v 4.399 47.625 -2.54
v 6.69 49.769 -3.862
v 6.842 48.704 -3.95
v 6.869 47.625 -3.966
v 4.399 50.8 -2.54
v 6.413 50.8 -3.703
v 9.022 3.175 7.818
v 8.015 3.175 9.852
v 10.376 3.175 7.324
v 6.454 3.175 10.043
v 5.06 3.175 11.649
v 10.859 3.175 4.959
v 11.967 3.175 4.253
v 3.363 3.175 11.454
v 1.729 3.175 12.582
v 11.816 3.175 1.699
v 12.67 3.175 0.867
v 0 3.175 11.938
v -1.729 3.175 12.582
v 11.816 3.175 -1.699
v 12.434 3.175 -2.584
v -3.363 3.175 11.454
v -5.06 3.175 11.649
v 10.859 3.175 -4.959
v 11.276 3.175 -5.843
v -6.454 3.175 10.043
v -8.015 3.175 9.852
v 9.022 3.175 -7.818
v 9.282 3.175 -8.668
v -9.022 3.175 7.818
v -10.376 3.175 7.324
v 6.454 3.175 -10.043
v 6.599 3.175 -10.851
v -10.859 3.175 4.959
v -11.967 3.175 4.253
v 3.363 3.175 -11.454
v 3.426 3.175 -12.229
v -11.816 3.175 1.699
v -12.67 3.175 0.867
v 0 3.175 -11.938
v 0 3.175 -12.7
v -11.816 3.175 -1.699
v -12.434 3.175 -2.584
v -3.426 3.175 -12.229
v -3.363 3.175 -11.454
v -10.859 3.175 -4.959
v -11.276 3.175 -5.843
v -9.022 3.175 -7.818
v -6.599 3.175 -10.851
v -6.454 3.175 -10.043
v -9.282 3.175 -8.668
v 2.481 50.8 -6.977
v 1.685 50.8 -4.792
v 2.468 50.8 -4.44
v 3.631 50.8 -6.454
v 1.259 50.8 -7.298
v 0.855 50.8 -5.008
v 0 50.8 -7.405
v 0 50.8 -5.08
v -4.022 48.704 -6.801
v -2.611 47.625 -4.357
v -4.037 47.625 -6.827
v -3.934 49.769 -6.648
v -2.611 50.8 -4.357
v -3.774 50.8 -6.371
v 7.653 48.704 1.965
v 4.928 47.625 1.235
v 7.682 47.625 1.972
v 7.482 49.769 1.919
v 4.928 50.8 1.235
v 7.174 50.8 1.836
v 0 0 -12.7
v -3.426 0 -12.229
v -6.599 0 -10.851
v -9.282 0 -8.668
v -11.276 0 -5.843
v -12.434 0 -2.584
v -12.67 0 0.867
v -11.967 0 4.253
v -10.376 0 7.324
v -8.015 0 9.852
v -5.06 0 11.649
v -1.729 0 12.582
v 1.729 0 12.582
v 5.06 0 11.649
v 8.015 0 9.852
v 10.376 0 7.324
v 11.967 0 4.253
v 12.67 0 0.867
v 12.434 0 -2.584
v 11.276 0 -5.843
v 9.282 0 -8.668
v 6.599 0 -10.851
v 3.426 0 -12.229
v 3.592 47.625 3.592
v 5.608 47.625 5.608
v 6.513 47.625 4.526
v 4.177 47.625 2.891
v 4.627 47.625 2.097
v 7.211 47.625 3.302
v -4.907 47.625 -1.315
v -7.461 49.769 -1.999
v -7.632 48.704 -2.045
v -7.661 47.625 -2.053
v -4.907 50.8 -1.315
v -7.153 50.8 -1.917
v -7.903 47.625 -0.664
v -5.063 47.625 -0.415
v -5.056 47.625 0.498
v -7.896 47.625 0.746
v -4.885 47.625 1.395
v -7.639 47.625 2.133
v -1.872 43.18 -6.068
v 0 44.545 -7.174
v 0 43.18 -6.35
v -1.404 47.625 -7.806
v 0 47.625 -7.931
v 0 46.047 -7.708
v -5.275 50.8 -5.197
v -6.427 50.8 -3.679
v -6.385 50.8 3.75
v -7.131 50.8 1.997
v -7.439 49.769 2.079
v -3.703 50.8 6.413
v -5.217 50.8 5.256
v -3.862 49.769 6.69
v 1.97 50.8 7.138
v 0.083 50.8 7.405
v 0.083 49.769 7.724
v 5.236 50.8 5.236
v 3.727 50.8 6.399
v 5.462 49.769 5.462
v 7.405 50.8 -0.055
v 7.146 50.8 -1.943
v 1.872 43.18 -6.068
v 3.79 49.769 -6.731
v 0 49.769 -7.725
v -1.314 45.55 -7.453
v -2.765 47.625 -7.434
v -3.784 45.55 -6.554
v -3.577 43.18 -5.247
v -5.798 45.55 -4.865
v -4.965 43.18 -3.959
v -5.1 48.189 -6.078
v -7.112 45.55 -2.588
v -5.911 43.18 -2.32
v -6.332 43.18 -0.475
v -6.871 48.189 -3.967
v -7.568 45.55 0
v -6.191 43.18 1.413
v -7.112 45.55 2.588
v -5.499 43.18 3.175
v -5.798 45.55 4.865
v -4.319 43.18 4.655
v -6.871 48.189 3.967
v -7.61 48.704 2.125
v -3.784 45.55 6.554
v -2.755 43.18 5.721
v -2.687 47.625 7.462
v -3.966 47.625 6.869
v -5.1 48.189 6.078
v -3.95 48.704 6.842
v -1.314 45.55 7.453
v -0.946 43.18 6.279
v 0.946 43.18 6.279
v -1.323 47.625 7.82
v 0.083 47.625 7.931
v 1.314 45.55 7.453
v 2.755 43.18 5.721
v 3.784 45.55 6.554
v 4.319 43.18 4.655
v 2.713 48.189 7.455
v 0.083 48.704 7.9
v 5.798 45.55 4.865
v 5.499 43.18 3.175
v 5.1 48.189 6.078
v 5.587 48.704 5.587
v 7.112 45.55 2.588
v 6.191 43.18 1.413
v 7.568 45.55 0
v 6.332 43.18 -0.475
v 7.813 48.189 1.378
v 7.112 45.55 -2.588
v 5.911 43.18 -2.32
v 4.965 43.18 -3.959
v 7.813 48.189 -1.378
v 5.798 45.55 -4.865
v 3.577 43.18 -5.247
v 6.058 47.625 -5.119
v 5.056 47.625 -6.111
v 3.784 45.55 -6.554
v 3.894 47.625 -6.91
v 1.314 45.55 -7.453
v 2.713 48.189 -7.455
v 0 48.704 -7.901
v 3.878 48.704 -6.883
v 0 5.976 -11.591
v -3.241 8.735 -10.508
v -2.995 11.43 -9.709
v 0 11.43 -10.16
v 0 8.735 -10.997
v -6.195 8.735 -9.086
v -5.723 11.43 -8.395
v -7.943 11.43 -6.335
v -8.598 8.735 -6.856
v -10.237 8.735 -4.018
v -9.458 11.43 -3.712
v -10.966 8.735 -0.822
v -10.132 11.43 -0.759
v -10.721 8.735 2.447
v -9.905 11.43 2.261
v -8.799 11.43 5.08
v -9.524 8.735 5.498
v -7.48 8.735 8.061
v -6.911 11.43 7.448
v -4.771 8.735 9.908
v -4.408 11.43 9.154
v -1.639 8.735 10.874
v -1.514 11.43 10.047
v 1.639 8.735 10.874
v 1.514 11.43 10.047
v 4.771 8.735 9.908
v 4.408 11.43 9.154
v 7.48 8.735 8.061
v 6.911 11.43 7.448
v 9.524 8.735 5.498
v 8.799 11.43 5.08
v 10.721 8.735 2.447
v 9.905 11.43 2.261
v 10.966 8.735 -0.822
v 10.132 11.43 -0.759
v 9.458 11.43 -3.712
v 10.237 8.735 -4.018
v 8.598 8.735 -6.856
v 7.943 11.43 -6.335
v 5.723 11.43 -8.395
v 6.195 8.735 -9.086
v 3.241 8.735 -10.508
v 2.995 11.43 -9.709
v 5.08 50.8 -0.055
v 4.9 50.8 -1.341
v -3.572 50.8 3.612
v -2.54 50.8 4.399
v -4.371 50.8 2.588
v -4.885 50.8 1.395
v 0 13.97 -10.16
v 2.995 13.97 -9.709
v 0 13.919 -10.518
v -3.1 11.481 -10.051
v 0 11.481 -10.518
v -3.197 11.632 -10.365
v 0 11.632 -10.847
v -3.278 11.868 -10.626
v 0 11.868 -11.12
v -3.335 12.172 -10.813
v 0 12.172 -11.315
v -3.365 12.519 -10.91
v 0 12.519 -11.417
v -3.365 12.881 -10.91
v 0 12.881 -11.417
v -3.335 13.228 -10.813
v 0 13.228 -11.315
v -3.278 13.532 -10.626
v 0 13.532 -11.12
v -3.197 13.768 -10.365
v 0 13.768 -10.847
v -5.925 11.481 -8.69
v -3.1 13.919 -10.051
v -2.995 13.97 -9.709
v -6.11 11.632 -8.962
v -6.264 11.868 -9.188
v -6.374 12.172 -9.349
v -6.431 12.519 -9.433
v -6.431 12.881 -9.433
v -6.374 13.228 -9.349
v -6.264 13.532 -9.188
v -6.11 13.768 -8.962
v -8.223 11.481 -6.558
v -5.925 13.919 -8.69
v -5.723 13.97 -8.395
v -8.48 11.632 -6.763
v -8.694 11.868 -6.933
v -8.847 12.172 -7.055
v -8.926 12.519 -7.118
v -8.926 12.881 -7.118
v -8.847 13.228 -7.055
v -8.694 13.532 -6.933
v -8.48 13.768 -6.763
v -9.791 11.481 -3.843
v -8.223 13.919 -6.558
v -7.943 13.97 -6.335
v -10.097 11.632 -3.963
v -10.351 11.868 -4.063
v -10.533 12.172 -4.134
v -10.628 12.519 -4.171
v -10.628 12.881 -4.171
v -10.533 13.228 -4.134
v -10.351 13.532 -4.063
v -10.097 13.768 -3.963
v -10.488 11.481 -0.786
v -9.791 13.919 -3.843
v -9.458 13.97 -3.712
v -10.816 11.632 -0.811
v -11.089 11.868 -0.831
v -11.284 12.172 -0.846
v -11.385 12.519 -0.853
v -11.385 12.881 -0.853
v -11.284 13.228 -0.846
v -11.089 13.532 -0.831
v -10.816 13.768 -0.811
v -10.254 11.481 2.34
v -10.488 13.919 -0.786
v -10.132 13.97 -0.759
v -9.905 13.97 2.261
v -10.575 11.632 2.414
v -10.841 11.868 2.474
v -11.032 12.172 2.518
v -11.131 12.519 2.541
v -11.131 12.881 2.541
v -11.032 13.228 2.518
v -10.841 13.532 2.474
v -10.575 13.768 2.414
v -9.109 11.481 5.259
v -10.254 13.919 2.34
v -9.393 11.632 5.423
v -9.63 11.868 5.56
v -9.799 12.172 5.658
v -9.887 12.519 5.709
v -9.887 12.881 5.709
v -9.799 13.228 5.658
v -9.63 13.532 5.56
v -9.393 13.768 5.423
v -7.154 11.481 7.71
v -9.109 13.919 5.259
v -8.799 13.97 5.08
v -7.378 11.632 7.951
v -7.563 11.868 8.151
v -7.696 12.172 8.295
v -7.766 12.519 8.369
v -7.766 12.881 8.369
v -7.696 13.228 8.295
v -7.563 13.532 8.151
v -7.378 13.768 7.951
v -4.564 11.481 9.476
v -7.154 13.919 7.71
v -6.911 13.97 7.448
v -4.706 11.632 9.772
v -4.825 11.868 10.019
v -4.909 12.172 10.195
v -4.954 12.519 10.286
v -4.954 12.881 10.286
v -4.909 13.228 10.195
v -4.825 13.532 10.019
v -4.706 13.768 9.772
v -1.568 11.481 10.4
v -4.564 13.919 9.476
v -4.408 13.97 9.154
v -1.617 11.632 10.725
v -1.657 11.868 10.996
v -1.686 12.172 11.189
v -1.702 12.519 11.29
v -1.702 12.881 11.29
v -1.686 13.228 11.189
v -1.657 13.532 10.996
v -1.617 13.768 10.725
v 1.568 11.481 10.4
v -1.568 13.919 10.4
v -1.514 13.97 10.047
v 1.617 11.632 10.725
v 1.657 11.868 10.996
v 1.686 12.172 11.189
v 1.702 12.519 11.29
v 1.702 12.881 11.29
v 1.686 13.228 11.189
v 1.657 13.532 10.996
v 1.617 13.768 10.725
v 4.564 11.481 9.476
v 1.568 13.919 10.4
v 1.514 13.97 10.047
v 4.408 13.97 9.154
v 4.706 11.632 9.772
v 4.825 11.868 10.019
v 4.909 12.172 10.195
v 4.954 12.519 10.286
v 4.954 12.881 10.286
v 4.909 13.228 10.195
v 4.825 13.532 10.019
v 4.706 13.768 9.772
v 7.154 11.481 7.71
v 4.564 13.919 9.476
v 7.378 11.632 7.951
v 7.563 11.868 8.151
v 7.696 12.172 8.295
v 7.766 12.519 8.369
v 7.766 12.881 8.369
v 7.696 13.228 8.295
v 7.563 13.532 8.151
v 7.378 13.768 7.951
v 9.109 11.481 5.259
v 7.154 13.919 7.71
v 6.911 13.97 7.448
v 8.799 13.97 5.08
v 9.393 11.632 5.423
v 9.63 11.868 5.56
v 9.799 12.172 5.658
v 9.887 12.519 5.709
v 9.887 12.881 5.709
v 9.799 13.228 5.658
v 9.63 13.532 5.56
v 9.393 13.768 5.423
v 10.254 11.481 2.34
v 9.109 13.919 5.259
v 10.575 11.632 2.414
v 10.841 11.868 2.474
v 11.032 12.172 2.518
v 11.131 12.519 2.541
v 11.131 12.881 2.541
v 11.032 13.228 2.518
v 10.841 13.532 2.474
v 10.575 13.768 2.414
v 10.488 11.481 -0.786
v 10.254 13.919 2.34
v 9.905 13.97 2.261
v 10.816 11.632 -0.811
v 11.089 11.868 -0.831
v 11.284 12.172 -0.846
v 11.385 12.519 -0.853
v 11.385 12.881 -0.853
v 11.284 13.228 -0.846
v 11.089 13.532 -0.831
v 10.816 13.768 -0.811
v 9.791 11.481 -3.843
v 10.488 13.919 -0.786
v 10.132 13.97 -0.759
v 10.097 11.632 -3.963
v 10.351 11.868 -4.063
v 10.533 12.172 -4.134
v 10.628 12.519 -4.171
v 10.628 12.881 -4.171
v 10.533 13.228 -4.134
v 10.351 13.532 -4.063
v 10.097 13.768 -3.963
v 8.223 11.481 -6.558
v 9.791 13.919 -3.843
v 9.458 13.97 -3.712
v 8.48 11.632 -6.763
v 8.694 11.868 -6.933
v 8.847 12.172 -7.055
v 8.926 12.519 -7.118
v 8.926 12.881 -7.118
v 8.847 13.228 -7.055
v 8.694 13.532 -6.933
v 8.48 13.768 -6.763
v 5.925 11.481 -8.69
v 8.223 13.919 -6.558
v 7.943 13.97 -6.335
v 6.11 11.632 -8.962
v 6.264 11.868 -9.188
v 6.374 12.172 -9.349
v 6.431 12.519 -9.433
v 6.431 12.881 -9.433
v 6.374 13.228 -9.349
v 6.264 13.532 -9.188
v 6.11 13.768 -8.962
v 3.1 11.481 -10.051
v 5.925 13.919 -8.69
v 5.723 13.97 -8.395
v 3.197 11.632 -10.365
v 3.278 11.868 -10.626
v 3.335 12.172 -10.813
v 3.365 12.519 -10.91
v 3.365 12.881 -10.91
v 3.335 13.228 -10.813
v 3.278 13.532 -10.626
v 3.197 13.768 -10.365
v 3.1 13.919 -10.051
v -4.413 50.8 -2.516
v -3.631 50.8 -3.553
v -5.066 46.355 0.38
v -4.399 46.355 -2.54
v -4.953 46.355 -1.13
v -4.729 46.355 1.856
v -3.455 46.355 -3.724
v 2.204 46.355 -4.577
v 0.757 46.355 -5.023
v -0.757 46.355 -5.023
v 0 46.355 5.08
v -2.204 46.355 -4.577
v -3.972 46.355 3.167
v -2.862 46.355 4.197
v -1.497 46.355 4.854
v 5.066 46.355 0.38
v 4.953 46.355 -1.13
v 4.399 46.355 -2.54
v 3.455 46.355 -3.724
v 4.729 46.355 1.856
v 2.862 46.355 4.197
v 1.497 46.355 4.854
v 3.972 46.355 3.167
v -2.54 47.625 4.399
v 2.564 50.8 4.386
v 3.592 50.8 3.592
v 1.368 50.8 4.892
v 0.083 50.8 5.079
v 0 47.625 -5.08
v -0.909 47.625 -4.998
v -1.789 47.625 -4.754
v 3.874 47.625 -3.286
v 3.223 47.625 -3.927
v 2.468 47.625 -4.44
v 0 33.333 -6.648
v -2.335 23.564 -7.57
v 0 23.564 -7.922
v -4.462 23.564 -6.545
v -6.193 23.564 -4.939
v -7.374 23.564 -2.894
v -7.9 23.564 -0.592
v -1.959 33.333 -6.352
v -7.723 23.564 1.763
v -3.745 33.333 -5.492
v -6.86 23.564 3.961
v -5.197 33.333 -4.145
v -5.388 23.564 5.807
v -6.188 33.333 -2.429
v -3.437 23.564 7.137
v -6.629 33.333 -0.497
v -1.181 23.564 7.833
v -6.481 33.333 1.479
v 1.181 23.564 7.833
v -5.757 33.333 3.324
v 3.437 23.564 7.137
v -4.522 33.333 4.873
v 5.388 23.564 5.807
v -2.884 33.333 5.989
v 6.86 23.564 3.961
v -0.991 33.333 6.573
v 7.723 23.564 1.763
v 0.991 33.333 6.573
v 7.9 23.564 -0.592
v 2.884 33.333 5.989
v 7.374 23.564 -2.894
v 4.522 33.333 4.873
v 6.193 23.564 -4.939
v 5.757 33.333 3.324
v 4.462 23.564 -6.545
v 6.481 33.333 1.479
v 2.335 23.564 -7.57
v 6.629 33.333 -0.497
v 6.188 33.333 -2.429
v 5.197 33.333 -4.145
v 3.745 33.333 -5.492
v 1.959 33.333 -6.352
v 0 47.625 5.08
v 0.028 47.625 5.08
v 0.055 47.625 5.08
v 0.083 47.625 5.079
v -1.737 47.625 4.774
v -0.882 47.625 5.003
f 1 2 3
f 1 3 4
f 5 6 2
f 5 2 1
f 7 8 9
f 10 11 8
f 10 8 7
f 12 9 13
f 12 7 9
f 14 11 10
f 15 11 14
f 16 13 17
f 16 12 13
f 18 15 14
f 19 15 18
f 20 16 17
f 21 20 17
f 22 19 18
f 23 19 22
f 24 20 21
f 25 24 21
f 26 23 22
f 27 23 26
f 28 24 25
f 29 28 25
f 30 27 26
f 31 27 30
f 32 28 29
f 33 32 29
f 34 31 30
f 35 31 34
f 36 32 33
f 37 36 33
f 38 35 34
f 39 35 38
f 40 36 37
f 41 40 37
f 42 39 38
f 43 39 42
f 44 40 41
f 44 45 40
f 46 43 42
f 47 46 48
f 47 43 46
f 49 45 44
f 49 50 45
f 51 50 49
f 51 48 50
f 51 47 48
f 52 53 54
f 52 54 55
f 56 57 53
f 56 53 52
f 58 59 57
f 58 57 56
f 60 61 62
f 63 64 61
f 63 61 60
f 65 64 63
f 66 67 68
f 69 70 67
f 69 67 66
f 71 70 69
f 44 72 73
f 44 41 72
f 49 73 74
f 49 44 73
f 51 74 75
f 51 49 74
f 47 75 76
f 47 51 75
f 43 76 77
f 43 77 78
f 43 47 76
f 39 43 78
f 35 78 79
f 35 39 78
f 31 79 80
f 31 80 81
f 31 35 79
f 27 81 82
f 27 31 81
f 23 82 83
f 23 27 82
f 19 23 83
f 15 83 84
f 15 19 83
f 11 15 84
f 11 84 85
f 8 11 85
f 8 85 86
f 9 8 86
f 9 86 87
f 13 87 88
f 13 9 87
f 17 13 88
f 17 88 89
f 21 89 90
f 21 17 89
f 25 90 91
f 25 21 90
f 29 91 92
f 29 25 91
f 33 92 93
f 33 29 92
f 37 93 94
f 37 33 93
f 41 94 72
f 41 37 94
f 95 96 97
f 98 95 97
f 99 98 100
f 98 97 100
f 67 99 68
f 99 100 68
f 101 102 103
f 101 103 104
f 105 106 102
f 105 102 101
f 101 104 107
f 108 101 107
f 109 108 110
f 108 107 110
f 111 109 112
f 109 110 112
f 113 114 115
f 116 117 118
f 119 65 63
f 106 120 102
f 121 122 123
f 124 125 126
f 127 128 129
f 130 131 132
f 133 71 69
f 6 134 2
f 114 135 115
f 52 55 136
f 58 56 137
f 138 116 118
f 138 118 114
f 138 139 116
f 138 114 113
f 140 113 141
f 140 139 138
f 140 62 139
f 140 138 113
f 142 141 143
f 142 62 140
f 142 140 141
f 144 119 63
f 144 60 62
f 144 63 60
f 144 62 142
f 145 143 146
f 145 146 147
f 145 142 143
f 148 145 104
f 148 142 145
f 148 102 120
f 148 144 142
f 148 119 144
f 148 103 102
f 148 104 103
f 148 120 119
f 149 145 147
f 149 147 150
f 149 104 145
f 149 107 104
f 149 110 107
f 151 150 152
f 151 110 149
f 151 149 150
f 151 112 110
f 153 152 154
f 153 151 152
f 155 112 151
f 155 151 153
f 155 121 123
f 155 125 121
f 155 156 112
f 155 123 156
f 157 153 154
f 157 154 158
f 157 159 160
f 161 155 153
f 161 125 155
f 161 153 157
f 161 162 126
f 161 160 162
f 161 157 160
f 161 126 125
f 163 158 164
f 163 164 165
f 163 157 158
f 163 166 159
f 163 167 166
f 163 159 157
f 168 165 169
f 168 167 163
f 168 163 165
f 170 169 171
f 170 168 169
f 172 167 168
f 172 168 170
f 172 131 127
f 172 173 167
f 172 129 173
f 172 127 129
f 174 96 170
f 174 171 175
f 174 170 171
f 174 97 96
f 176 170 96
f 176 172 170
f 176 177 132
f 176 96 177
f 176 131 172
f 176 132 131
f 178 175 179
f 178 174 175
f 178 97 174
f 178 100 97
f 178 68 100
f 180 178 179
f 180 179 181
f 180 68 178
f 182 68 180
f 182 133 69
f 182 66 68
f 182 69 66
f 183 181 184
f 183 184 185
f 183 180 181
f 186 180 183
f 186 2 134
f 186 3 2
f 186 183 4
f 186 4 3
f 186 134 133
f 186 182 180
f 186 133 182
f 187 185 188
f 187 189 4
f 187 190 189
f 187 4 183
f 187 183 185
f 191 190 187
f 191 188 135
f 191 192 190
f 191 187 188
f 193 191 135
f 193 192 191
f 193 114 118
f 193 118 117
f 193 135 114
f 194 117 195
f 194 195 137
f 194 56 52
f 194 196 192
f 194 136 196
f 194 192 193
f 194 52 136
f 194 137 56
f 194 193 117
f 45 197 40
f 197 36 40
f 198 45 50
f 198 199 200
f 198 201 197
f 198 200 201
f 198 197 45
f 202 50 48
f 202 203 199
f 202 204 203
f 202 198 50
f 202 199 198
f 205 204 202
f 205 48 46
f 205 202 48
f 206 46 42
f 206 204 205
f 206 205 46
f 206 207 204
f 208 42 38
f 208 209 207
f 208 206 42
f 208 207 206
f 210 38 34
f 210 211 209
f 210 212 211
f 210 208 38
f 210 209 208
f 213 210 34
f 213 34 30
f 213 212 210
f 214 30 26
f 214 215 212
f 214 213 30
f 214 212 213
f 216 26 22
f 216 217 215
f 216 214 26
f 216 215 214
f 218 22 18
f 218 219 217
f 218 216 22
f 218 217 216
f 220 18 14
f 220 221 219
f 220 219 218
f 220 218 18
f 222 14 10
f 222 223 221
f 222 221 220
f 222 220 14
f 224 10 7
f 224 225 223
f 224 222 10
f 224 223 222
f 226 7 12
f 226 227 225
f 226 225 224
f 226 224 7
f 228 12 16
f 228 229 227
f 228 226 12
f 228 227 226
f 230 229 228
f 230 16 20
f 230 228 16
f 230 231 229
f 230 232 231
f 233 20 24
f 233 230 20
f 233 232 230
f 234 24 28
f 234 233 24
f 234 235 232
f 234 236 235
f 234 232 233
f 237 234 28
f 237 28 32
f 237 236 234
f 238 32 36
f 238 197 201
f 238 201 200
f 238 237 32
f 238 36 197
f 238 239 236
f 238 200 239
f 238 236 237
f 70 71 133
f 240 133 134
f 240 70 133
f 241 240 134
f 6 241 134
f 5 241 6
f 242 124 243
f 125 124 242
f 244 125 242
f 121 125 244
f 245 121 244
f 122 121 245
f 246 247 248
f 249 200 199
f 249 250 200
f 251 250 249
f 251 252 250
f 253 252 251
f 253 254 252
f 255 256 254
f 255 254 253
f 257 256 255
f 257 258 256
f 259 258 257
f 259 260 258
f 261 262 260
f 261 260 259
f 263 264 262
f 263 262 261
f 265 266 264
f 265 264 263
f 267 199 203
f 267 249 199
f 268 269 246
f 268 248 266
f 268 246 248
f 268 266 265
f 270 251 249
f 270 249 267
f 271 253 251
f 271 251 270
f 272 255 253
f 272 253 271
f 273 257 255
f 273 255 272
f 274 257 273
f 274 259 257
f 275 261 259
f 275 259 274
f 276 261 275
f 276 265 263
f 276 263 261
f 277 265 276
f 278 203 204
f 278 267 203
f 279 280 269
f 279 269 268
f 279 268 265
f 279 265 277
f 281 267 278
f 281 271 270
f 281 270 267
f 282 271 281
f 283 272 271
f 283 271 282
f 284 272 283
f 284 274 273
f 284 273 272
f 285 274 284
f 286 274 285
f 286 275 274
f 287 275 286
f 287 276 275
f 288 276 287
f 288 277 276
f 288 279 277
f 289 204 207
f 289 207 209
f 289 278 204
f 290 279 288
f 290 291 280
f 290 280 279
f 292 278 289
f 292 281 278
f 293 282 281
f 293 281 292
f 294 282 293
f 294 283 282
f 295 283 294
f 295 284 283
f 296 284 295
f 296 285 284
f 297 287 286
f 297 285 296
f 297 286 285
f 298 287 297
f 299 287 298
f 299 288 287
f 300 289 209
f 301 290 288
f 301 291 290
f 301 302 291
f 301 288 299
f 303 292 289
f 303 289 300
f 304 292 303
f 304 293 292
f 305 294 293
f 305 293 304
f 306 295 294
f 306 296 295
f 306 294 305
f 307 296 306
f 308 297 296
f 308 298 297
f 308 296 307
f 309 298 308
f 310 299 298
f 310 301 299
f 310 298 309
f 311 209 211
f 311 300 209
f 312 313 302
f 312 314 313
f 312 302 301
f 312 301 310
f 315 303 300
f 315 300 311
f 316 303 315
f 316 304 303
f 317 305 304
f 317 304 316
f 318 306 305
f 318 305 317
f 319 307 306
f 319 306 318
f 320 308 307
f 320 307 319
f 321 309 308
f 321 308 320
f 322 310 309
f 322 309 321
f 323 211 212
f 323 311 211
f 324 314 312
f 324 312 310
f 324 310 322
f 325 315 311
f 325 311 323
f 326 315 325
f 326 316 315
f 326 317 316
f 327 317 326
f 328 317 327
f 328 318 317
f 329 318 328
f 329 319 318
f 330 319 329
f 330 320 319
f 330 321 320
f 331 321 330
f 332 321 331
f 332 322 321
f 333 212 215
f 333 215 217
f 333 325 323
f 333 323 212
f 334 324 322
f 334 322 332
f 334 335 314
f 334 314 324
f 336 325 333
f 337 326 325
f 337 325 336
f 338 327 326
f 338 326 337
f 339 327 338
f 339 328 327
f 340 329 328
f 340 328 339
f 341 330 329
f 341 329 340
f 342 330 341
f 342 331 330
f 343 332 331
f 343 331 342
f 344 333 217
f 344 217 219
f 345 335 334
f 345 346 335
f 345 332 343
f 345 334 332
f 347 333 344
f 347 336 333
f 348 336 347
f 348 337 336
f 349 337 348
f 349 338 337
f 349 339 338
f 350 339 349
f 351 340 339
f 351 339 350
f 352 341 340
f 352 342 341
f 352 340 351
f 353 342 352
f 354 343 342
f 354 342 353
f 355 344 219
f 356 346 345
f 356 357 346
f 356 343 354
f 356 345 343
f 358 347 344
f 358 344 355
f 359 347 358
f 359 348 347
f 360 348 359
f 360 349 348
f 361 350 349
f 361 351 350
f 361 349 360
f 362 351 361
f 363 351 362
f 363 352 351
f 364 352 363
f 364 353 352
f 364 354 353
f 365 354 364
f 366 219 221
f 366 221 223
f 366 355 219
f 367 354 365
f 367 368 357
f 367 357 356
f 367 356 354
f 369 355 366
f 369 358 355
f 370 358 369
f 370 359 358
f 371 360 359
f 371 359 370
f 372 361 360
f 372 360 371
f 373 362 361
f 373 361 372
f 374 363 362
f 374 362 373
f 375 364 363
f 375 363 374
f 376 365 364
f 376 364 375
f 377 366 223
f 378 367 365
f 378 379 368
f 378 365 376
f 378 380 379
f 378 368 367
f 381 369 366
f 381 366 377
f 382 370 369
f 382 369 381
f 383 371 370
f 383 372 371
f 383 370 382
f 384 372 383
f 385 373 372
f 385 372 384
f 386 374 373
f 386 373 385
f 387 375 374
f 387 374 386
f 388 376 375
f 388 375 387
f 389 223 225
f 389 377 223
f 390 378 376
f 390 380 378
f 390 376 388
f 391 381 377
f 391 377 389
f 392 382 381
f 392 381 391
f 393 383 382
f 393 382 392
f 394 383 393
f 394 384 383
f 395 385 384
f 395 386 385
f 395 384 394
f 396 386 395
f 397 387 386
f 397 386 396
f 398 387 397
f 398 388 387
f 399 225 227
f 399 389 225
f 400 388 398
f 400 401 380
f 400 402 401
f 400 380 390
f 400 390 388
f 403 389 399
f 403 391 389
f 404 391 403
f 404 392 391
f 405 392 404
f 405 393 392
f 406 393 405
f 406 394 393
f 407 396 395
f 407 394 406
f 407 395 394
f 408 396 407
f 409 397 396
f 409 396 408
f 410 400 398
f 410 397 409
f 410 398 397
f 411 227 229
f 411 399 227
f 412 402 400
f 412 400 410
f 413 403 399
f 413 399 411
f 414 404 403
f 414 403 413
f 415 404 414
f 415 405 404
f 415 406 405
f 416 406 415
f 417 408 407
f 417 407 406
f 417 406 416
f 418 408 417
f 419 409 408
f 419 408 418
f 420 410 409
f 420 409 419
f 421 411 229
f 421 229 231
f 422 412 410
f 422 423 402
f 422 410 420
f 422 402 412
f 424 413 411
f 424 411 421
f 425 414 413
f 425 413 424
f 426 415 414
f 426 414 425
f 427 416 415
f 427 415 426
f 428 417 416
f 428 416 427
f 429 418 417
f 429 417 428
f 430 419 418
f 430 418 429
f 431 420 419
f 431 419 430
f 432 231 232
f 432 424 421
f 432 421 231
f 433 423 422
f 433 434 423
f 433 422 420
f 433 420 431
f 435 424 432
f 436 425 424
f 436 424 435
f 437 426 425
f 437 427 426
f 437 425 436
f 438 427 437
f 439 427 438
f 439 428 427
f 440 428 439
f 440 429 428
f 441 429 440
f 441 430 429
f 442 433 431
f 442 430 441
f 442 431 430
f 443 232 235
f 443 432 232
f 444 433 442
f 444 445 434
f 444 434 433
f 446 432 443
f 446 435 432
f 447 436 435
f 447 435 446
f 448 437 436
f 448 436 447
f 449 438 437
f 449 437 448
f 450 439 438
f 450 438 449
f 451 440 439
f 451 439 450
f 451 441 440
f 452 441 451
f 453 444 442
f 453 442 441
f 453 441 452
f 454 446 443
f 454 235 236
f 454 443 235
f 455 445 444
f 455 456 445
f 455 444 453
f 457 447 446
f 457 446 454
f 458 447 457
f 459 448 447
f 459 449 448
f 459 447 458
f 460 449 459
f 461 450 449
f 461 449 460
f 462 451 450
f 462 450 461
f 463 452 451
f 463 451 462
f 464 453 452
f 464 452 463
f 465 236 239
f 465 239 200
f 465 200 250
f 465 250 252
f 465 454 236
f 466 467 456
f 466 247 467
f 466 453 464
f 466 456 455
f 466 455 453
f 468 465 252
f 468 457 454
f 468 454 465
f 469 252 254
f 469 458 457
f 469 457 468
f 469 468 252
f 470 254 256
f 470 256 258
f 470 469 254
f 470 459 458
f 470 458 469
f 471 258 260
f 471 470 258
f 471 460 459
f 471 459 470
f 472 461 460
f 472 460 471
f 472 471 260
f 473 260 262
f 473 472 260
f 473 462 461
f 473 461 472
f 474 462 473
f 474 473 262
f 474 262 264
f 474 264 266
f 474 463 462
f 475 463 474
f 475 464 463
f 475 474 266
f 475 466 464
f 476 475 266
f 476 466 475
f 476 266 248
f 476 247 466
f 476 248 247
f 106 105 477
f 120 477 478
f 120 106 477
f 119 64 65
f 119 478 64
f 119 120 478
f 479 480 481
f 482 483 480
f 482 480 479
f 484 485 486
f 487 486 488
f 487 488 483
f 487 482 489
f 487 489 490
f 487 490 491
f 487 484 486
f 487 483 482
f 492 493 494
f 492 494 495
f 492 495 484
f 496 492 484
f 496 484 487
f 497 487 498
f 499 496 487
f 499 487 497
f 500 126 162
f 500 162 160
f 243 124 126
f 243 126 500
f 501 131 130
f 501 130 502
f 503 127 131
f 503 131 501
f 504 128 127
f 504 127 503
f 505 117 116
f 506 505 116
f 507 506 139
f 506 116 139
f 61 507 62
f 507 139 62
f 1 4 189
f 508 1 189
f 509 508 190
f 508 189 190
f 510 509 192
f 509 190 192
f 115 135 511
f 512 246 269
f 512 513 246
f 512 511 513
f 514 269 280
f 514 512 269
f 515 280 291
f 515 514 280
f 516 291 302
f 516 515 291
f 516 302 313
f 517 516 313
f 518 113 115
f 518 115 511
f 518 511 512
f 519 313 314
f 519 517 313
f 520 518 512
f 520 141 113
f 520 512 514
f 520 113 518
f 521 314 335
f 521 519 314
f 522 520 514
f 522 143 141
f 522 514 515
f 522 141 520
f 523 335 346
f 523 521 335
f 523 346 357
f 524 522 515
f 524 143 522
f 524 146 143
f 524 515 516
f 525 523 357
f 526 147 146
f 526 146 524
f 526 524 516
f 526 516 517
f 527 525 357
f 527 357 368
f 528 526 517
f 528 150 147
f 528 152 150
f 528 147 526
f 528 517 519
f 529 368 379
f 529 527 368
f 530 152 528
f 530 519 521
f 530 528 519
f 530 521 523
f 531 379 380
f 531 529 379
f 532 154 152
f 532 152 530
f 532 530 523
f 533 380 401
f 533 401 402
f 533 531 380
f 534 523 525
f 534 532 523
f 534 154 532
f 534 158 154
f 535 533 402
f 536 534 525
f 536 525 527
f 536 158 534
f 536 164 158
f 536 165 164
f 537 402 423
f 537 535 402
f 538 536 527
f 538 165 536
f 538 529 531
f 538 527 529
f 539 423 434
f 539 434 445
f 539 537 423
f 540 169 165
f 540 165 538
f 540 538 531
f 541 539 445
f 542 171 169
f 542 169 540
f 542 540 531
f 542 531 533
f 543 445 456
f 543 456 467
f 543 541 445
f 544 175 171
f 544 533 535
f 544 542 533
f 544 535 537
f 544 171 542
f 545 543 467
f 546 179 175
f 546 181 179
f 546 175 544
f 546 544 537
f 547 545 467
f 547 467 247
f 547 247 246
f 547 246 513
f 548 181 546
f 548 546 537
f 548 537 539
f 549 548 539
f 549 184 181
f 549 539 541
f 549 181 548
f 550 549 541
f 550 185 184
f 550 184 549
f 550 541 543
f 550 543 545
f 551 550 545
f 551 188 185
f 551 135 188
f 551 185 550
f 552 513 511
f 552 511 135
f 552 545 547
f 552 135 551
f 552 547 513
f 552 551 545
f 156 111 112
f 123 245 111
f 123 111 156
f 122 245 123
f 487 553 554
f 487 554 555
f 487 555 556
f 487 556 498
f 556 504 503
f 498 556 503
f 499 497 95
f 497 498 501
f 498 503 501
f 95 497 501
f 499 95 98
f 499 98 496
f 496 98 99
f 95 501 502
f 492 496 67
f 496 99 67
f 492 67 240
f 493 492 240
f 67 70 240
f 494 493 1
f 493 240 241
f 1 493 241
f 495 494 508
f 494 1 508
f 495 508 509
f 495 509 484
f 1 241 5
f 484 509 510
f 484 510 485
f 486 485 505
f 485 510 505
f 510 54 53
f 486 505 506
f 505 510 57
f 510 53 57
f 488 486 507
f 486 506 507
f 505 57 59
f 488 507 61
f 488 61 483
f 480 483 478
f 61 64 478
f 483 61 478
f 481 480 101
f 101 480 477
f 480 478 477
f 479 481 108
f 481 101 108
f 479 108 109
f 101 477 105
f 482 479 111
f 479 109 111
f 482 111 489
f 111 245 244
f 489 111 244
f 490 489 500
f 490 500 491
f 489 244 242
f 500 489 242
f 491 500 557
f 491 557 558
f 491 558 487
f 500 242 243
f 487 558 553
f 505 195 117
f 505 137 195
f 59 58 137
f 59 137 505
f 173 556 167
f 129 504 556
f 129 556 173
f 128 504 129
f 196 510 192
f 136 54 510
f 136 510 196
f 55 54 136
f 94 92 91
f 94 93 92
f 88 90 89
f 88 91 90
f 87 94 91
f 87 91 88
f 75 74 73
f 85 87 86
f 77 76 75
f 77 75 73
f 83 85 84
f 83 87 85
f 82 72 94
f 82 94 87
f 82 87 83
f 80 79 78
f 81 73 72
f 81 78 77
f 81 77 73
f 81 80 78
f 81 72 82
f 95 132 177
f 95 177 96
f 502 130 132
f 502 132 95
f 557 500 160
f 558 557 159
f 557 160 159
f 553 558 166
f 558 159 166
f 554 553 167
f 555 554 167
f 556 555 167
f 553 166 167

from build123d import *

# Parameters (mm, degrees)
SKETCH2_R          = 5.08
CUT_EXTRUDE1_DEPTH = 4.445
CUT_EXTRUDE2_DEPTH = 3.175
CIRPATTERN1_COUNT  = 5
CIRPATTERN1_ANGLE  = 300


with BuildPart() as part:
    # Sketch1 → Revolve1 (revolve)
    with BuildSketch(Plane.XY, mode=Mode.PRIVATE) as revolve1_sk:
        with BuildLine():
            Line((0, 0), (12.7, 0))
            Line((12.7, 0), (12.7, 3.175))
            Line((12.7, 3.175), (11.938, 3.175))
            ThreePointArc((11.938, 3.175), (11.324664102, 7.361873807), (10.16, 11.43))
            ThreePointArc((10.16, 11.43), (11.43, 12.7), (10.16, 13.97))
            ThreePointArc((10.16, 13.97), (7.163161242, 28.432586249), (6.35, 43.18))
            ThreePointArc((6.35, 43.18), (7.862457045, 46.853612737), (7.405308906, 50.8))
            Line((7.405308906, 50.8), (0, 50.8))
            Line((0, 50.8), (0, 0))
        make_face()
    revolve(revolve1_sk.sketch.rotate(Axis((0, 0, 0), (0, 1, 0)), 90), axis=Axis((0, 0, 0), (0, 1, 0)))

    # Sketch2 → Cut-Extrude1 (cut)
    with BuildSketch(Plane(origin=(0, 50.8, 0), x_dir=(1, 0, 0), z_dir=(0, 1, 0))):
        with Locations(Location((0, 0, 0), (0, 0, 270))):
            Circle(SKETCH2_R)
    extrude(amount=-CUT_EXTRUDE1_DEPTH, mode=Mode.SUBTRACT)

    # Sketch3 → Cut-Extrude2 (cut)
    with BuildSketch(Plane(origin=(0, 50.8, 0), x_dir=(1, 0, 0), z_dir=(0, 1, 0))):
        with BuildLine():
            Line((0, 10.16), (0, 5.08))
            ThreePointArc((0, 5.08), (-1.354819608, 4.896004885), (-2.611497409, 4.357347965))
            Line((-2.611497409, 4.357347965), (-5.070044486, 8.615676415))
            ThreePointArc((-5.070044486, 8.615676415), (-2.637496551, 9.724263362), (0, 10.16))
        make_face()
    cut_extrude2 = extrude(amount=-CUT_EXTRUDE2_DEPTH, mode=Mode.SUBTRACT)

    # CirPattern1: Cut-Extrude2 ×5 about axis
    cirpattern1_axis = Axis((0, 0, 0), (0, 1, 0))
    for i in range(1, CIRPATTERN1_COUNT):
        add(cut_extrude2.rotate(cirpattern1_axis, i * CIRPATTERN1_ANGLE / (CIRPATTERN1_COUNT - 1)), mode=Mode.SUBTRACT)


solid = part.part
